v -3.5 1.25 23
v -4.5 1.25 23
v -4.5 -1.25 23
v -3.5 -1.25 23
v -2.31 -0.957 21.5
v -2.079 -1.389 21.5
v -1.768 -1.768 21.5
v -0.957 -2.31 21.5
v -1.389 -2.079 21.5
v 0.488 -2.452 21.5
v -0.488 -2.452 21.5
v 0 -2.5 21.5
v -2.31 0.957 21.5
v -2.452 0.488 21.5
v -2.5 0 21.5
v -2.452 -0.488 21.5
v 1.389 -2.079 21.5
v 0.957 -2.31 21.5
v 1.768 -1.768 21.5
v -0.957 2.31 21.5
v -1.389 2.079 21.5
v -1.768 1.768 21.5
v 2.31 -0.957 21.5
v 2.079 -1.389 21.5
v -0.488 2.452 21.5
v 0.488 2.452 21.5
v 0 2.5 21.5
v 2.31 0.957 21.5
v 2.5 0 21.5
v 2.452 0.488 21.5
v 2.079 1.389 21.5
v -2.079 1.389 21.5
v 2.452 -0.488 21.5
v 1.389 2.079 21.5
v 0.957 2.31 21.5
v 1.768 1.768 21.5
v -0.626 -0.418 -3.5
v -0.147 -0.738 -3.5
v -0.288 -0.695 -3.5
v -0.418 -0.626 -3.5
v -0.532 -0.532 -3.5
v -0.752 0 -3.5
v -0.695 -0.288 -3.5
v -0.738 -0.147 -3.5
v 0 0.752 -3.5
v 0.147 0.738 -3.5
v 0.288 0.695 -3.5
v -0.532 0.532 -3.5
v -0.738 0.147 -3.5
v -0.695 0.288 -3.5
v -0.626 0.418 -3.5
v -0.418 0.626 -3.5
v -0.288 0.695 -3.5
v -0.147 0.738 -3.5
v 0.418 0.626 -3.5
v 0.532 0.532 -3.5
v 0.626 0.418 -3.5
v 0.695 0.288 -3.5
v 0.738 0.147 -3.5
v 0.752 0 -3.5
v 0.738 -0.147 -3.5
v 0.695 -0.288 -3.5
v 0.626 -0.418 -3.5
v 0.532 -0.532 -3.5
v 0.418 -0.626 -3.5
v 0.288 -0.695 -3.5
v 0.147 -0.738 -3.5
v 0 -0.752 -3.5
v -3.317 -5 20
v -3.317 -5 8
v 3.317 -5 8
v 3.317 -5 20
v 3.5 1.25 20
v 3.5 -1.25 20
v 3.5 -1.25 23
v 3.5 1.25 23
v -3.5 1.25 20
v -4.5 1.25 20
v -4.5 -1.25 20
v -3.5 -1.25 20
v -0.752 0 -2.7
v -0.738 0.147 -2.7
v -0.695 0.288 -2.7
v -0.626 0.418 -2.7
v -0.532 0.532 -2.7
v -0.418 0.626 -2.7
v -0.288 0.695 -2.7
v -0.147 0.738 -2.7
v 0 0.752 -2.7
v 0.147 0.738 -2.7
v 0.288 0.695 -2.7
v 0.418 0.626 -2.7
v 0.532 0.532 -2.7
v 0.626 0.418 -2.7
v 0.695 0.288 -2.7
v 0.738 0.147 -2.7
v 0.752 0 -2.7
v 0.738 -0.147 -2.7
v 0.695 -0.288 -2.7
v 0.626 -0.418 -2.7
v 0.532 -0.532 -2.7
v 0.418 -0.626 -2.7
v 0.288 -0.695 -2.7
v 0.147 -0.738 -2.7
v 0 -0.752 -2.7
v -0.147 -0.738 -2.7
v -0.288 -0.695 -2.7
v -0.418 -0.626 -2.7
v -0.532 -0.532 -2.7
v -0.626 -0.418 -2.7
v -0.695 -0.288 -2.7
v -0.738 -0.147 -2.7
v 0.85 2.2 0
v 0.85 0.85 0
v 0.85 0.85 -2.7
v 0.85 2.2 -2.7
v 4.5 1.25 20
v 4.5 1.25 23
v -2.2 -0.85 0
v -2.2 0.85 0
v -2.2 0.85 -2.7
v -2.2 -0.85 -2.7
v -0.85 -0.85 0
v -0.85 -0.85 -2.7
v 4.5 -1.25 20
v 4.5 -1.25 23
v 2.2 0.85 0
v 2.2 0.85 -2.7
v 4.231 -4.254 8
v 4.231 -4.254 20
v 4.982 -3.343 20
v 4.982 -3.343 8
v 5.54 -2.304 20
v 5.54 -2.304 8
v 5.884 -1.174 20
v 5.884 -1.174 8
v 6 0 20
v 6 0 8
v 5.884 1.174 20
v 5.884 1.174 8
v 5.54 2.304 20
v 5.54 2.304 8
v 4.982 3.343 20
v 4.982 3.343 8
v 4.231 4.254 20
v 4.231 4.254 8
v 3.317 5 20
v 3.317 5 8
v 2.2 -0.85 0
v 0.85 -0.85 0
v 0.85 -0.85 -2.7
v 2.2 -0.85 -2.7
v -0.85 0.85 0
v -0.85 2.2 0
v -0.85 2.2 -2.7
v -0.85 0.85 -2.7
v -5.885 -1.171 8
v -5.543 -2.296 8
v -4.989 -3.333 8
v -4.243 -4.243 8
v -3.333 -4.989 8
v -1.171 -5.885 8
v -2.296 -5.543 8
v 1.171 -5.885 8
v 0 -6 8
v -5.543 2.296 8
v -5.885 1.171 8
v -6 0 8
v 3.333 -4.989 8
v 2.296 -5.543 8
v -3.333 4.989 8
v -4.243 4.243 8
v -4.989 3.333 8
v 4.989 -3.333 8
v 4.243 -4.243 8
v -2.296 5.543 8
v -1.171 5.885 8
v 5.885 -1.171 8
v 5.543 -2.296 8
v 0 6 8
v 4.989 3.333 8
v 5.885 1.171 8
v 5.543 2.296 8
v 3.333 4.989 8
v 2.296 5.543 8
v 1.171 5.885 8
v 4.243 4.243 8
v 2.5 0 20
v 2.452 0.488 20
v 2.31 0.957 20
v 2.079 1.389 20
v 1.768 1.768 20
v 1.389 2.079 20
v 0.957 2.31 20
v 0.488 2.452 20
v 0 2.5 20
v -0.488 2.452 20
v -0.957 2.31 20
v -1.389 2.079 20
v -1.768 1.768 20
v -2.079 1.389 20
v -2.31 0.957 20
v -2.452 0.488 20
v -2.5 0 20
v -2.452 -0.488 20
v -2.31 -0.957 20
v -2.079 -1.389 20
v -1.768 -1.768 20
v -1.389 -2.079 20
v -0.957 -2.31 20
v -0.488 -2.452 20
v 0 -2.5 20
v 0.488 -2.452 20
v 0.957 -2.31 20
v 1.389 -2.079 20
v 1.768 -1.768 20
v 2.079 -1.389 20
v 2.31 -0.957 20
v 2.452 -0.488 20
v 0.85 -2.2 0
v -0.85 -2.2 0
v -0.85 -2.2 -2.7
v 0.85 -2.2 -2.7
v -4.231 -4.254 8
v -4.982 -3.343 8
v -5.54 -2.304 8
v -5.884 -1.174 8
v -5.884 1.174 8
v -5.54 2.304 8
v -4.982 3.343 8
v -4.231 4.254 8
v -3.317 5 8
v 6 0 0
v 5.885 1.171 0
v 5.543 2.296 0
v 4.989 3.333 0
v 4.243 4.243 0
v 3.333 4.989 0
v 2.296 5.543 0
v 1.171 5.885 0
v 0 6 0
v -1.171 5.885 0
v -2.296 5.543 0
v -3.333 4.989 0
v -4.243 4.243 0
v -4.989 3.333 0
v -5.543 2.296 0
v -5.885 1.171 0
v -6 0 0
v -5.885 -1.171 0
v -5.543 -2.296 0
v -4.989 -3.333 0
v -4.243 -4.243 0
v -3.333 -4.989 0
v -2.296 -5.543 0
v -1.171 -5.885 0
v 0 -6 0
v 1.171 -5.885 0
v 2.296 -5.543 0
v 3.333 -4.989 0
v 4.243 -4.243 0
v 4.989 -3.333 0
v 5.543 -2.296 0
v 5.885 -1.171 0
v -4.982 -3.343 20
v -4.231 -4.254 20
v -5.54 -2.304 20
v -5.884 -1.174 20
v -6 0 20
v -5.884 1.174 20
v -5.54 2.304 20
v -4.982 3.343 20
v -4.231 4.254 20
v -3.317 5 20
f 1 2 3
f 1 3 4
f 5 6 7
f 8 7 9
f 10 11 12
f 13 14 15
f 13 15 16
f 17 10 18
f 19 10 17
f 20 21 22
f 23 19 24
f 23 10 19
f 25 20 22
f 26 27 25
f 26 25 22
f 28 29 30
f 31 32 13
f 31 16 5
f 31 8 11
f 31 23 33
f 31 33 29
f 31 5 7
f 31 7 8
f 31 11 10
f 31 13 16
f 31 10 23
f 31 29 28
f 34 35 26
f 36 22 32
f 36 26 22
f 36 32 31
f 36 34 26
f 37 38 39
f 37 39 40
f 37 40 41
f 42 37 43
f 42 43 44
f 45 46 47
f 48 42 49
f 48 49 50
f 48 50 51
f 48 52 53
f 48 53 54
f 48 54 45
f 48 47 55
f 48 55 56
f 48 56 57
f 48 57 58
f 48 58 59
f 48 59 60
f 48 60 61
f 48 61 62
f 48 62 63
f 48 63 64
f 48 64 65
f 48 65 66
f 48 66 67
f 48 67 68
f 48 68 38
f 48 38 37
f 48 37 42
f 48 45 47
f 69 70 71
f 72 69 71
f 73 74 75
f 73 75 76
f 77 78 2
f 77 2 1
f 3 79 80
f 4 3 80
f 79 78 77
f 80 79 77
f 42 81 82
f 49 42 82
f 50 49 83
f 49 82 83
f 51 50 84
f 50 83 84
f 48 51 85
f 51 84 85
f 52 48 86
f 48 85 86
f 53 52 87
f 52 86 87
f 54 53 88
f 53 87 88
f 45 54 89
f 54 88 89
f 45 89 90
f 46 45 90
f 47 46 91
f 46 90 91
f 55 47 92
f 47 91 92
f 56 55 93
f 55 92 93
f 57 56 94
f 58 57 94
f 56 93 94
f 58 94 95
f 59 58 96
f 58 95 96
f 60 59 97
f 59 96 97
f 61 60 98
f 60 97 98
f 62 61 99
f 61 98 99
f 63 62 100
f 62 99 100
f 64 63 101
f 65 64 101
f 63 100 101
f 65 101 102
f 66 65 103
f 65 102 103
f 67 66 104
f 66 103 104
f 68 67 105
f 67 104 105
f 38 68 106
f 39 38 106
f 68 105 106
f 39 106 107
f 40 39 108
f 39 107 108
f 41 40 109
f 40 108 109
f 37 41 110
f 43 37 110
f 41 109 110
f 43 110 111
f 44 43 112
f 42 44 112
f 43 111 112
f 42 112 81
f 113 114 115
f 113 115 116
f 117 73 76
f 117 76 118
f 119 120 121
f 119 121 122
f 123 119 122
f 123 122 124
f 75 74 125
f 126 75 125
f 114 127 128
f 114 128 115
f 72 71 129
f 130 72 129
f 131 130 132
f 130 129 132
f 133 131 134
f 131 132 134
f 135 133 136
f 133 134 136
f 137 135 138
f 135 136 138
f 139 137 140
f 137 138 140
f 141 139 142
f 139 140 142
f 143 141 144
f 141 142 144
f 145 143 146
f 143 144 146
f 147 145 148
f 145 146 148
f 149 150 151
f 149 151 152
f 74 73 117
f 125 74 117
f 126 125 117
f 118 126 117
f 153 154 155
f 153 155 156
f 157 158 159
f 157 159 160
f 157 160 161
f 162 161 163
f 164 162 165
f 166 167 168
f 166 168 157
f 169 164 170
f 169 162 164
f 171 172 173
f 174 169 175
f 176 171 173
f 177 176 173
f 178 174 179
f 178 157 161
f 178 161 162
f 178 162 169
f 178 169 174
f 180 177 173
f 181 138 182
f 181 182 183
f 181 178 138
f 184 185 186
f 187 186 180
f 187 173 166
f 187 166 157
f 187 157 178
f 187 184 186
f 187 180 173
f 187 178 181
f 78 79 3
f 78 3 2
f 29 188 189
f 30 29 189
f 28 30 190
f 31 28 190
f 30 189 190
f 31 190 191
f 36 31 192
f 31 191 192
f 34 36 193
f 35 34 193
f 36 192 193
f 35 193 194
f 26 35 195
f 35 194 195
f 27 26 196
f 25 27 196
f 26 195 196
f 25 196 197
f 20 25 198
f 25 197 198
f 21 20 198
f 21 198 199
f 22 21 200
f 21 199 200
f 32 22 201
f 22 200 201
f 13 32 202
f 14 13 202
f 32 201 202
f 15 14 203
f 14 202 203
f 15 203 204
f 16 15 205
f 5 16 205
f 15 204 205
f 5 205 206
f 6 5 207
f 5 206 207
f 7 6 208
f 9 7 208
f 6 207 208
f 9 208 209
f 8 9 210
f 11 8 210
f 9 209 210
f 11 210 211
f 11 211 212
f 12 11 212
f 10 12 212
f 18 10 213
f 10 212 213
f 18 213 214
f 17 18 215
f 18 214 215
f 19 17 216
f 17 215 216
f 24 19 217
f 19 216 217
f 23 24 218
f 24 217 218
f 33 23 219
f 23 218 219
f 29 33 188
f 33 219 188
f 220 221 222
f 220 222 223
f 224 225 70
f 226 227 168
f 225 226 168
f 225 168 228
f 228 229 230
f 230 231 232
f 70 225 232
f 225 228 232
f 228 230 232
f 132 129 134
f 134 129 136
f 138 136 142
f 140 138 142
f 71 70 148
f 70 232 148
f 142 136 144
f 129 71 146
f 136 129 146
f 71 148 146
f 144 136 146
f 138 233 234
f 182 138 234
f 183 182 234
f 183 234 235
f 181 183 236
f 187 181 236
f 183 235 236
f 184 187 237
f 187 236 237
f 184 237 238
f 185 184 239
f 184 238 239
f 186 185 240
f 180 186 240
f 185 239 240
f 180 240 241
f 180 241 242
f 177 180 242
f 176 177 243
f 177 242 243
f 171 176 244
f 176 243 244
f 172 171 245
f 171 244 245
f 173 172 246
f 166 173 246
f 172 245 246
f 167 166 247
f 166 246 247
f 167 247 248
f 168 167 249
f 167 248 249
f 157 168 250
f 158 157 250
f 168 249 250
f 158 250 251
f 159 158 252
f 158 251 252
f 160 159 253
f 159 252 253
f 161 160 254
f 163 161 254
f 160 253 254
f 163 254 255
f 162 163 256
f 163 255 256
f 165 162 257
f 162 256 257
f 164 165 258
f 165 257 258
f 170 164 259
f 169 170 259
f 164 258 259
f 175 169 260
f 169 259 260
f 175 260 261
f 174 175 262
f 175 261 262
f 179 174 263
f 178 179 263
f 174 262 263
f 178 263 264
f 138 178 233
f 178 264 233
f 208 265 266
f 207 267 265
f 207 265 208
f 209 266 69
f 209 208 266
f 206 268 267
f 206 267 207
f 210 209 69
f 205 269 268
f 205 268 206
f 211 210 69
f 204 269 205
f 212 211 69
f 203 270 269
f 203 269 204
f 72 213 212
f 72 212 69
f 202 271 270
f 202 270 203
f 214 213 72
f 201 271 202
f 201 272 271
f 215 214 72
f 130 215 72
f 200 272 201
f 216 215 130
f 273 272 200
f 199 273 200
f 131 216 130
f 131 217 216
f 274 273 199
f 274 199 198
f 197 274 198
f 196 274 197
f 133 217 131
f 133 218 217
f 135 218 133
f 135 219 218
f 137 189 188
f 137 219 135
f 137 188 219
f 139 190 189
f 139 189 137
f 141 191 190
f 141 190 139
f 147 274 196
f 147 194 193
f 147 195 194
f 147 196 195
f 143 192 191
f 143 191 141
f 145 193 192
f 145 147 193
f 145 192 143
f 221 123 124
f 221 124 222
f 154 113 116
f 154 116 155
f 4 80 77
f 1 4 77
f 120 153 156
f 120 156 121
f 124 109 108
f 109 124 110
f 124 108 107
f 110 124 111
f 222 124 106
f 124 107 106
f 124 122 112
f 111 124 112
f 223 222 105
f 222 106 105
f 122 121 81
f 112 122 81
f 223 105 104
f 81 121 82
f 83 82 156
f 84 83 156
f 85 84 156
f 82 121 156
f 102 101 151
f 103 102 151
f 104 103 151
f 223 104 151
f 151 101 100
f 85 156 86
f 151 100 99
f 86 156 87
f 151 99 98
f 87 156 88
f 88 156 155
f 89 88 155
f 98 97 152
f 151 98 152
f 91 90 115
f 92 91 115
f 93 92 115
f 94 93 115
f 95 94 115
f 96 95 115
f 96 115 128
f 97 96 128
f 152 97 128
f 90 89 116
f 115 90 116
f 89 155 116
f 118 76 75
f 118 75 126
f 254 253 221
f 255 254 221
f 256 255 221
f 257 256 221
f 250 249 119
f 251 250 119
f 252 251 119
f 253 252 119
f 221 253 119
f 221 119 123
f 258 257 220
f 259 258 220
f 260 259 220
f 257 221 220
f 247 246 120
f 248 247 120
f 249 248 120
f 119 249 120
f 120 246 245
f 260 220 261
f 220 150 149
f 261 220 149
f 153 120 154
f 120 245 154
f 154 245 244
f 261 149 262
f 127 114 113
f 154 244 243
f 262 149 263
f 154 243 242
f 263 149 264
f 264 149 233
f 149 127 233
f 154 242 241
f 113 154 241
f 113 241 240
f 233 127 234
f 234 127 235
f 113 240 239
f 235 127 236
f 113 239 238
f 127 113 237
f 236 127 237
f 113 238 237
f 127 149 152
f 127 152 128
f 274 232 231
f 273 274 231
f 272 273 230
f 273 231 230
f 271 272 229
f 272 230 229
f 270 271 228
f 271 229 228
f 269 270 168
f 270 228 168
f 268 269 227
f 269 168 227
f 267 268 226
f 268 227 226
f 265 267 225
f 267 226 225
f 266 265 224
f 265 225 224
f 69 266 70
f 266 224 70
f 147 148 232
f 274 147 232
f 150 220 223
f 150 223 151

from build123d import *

# Parameters (mm, degrees)
CROQUIS1_R                = 6
SALIENTE_EXTRUIR1_DEPTH   = 8
SALIENTE_EXTRUIR2_DEPTH   = 12
SALIENTE_EXTRUIR3_DEPTH   = 2.7
CROQUIS4_R                = 0.752318365
SALIENTE_EXTRUIR4_DEPTH   = 0.8
CROQUIS5_R                = 2.5
SALIENTE_EXTRUIR5_DEPTH   = 1.5
CROQUIS6_W                = 1
CROQUIS6_H                = 2.5
SALIENTE_EXTRUIR6_DEPTH   = 3
SALIENTE_EXTRUIR6_2_DEPTH = 3


with BuildPart() as part:
    # Croquis1 → Saliente-Extruir1 (new body)
    with BuildSketch(Plane.XY):
        Circle(CROQUIS1_R)
    extrude(amount=SALIENTE_EXTRUIR1_DEPTH)

    # Croquis3 → Saliente-Extruir3 (add)
    with BuildSketch(Plane(origin=(0, 0, 0), x_dir=(-1, 0, 0), z_dir=(0, 0, -1))):
        Polygon((-2.2, 0.85), (-0.85, 0.85), (-0.85, 2.2), (0.85, 2.2), (0.85, 0.85), (2.2, 0.85), (2.2, -0.85), (0.85, -0.85), (0.85, -2.2), (-0.85, -2.2), (-0.85, -0.85), (-2.2, -0.85), align=None)
    extrude(amount=SALIENTE_EXTRUIR3_DEPTH)

    # Croquis4 → Saliente-Extruir4 (add)
    with BuildSketch(Plane(origin=(0, 0, -2.7), x_dir=(-1, 0, 0), z_dir=(0, 0, -1))):
        Circle(CROQUIS4_R)
    extrude(amount=SALIENTE_EXTRUIR4_DEPTH)


with BuildPart() as body_2:
    # Croquis2 → Saliente-Extruir2 (new body)
    with BuildSketch(Plane.XY.offset(8)):
        with BuildLine():
            Line((3.31662479, 5), (-3.31662479, 5))
            ThreePointArc((-3.31662479, 5), (-6, 0), (-3.31662479, -5))
            Line((-3.31662479, -5), (3.31662479, -5))
            ThreePointArc((3.31662479, -5), (6, 0), (3.31662479, 5))
        make_face()
    extrude(amount=SALIENTE_EXTRUIR2_DEPTH)

    # Croquis5 → Saliente-Extruir5 (add)
    with BuildSketch(Plane.XY.offset(20)):
        Circle(CROQUIS5_R)
    extrude(amount=SALIENTE_EXTRUIR5_DEPTH)


with BuildPart() as body_3:
    # Croquis6 → Saliente-Extruir6 (new body)
    with BuildSketch(Plane.XY.offset(20)):
        with Locations((-4, 0)):
            Rectangle(CROQUIS6_W, CROQUIS6_H)
    extrude(amount=SALIENTE_EXTRUIR6_DEPTH)


with BuildPart() as body_4:
    # Croquis6 → Saliente-Extruir6 2 (new body)
    with BuildSketch(Plane.XY.offset(20)):
        with Locations((4, 0)):
            Rectangle(CROQUIS6_W, CROQUIS6_H)
    extrude(amount=SALIENTE_EXTRUIR6_2_DEPTH)


solid = Compound([part.part, body_2.part, body_3.part, body_4.part])
